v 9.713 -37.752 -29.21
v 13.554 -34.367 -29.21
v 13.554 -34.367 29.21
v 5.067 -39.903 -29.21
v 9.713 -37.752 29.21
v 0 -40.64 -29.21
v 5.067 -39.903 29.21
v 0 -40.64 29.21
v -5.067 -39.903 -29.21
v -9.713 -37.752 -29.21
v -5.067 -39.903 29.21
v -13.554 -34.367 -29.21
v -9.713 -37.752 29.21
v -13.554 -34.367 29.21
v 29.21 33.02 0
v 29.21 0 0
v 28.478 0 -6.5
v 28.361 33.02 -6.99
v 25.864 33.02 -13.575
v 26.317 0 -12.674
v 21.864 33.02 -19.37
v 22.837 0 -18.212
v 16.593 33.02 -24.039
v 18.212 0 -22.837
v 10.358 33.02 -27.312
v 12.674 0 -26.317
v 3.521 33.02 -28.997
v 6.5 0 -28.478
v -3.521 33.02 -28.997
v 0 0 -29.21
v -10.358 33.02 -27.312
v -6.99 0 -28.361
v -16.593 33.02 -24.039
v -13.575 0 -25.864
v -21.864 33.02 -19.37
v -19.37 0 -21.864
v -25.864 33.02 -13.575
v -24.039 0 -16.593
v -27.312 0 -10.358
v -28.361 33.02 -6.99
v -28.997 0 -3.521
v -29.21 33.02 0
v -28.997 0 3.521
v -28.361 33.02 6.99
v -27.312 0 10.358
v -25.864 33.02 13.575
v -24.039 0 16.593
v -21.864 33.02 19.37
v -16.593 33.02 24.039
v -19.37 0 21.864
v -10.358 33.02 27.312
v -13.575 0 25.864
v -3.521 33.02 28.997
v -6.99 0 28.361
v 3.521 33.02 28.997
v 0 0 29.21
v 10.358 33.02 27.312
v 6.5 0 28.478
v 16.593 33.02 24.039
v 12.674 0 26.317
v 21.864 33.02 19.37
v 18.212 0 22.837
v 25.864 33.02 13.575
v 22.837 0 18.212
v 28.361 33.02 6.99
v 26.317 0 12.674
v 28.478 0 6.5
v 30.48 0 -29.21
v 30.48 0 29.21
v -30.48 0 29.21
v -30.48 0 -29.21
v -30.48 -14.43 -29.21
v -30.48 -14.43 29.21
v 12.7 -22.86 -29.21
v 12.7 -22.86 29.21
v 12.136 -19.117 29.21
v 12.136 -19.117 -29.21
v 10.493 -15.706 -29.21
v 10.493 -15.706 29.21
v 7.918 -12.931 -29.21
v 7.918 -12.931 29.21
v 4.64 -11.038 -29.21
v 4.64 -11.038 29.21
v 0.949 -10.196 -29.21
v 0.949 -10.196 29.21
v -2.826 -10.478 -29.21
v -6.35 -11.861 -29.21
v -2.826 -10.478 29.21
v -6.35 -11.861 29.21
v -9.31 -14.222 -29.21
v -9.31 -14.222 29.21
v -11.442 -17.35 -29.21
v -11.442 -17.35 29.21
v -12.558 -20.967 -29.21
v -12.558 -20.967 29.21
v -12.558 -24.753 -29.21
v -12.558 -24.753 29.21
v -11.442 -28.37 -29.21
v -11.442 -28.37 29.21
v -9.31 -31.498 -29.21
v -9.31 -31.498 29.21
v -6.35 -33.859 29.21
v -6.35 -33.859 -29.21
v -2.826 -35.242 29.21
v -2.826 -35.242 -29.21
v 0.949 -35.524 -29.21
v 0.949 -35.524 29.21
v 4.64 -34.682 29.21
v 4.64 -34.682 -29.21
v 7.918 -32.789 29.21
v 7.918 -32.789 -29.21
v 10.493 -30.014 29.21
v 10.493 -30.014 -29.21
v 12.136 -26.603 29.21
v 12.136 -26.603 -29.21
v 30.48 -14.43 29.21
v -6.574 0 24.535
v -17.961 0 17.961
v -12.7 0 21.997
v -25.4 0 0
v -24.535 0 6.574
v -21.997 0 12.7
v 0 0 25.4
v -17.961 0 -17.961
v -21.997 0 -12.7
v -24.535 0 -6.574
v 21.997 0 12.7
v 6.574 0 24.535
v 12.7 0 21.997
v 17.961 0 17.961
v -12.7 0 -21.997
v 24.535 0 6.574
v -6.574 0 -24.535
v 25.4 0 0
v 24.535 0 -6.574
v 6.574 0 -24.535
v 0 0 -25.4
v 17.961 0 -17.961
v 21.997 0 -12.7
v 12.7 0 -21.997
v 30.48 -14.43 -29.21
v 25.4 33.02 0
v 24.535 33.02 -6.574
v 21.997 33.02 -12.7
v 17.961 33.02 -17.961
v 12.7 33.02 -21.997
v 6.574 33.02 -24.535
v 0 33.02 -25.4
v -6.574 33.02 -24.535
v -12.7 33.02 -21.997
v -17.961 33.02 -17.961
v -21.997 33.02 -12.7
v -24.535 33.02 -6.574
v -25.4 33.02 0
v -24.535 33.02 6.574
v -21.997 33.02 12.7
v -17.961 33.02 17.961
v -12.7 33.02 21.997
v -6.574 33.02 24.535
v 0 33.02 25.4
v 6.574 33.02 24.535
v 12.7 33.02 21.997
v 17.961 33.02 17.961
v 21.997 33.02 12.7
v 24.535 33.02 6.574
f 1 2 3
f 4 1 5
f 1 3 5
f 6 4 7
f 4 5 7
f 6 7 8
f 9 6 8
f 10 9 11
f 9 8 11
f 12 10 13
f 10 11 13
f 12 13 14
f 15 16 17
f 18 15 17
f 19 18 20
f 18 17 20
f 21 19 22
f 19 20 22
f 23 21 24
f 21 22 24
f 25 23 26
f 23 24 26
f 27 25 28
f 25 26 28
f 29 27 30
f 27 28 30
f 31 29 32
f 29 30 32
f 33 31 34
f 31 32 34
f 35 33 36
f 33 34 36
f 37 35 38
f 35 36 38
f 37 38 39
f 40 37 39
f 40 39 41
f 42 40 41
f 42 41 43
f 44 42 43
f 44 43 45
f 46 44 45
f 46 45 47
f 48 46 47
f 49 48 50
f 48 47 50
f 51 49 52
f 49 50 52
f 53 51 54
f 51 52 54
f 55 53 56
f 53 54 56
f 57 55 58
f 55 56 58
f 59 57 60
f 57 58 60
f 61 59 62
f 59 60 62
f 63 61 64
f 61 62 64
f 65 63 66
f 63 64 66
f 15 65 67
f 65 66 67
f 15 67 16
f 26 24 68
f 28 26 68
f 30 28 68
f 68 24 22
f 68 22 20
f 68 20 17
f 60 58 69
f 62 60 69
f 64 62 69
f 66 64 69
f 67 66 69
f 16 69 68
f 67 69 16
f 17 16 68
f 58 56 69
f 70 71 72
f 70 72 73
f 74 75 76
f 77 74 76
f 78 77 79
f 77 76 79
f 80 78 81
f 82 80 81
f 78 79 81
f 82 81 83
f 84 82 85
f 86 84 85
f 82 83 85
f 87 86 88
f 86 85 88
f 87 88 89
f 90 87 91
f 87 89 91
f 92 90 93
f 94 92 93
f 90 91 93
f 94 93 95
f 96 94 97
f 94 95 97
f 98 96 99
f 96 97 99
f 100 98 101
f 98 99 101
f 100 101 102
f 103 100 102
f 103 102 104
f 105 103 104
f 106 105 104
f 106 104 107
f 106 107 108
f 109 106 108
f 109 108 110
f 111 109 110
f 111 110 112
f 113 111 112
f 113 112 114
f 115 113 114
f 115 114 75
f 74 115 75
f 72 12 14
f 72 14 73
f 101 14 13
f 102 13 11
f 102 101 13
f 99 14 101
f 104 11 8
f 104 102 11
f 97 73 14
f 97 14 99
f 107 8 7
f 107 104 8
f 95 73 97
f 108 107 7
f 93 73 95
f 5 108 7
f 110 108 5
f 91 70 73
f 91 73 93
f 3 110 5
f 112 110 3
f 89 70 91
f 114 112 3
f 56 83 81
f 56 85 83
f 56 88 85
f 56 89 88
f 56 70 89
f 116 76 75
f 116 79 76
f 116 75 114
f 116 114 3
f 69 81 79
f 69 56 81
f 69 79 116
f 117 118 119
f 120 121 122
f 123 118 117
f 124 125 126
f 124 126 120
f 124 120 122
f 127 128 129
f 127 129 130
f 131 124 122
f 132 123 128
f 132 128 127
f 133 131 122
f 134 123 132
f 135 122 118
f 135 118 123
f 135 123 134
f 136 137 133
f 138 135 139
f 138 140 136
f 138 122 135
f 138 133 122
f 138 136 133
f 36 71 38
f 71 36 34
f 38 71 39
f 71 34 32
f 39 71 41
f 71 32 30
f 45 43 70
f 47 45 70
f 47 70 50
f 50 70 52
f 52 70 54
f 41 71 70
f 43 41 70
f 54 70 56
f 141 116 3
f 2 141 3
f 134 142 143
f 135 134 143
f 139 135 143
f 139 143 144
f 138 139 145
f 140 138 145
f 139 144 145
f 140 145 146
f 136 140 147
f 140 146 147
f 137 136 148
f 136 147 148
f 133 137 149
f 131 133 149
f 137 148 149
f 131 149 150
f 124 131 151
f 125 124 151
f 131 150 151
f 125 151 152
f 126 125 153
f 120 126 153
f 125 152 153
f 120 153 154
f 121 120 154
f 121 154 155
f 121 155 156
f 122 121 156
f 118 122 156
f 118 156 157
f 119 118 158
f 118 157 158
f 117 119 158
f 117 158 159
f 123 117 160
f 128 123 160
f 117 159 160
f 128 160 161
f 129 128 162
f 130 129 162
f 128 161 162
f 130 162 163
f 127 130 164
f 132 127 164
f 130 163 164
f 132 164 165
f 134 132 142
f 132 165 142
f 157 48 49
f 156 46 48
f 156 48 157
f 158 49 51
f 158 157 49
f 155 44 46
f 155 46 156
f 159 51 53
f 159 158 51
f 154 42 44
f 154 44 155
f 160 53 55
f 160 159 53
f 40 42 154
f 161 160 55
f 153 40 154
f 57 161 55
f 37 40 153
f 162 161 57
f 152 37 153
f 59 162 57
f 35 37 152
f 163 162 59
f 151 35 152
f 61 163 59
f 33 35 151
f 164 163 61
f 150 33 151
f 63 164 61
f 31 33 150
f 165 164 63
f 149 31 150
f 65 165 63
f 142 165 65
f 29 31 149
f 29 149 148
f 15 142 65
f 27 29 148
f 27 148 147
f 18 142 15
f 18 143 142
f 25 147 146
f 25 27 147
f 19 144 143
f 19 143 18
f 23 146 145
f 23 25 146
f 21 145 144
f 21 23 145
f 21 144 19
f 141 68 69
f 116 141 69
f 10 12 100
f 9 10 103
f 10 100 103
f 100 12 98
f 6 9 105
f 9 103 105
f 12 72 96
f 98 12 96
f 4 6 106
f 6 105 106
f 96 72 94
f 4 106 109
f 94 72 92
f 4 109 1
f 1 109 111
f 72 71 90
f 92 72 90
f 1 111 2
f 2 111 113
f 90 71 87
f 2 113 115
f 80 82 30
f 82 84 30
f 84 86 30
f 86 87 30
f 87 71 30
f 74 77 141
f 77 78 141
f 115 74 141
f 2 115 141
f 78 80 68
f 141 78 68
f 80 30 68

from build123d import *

# Parameters (mm, degrees)
SKETCH1_R               = 29.21
BOSS_EXTRUDE1_DEPTH     = 33.02
SKETCH2_W               = 60.96
SKETCH2_H               = 58.42
BOSS_EXTRUDE2_DEPTH     = 40.64
SKETCH3_R               = 12.7
CUT_EXTRUDE1_DEPTH      = 59.42
SKETCH4_R               = 25.4
CUT_EXTRUDE2_DEPTH      = 33.02
CUT_EXTRUDE3_DEPTH      = 1
CUT_EXTRUDE3_DEPTH_BACK = 59.42


with BuildPart() as part:
    # Sketch1 → Boss-Extrude1 (new body)
    with BuildSketch(Plane(origin=(0, 0, 0), x_dir=(1, 0, 0), z_dir=(0, 1, 0))):
        Circle(SKETCH1_R)
    extrude(amount=BOSS_EXTRUDE1_DEPTH)

    # Sketch2 → Boss-Extrude2 (add)
    with BuildSketch(Plane.XZ):
        Rectangle(SKETCH2_W, SKETCH2_H)
    extrude(amount=BOSS_EXTRUDE2_DEPTH)

    # Sketch3 → Cut-Extrude1 (cut, through all)
    with BuildSketch(Plane.XY.offset(29.21)):
        with Locations((0, -22.86)):
            Circle(SKETCH3_R)
    extrude(amount=-CUT_EXTRUDE1_DEPTH, mode=Mode.SUBTRACT)

    # Sketch4 → Cut-Extrude2 (cut)
    with BuildSketch(Plane(origin=(0, 33.02, 0), x_dir=(1, 0, 0), z_dir=(0, 1, 0))):
        Circle(SKETCH4_R)
    extrude(amount=-CUT_EXTRUDE2_DEPTH, mode=Mode.SUBTRACT)

    # Sketch5 → Cut-Extrude3 (cut, two sides)
    with BuildSketch(Plane.XY.offset(29.21)) as cut_extrude3_sk:
        with BuildLine():
            Line((30.48, -14.429530232), (13.554352704, -34.366864159))
            ThreePointArc((13.554352704, -34.366864159), (7.467809426, -38.995681652), (0, -40.64))
            Line((0, -40.64), (30.48, -40.64))
            Line((30.48, -40.64), (30.48, -14.429530232))
        make_face()
        with BuildLine():
            Line((-30.48, -40.64), (0, -40.64))
            ThreePointArc((0, -40.64), (-7.467809426, -38.995681652), (-13.554352704, -34.366864159))
            Line((-13.554352704, -34.366864159), (-30.48, -14.429530232))
            Line((-30.48, -14.429530232), (-30.48, -40.64))
        make_face()
    extrude(amount=CUT_EXTRUDE3_DEPTH, mode=Mode.SUBTRACT)
    extrude(cut_extrude3_sk.sketch, amount=-CUT_EXTRUDE3_DEPTH_BACK, mode=Mode.SUBTRACT)


solid = part.part
